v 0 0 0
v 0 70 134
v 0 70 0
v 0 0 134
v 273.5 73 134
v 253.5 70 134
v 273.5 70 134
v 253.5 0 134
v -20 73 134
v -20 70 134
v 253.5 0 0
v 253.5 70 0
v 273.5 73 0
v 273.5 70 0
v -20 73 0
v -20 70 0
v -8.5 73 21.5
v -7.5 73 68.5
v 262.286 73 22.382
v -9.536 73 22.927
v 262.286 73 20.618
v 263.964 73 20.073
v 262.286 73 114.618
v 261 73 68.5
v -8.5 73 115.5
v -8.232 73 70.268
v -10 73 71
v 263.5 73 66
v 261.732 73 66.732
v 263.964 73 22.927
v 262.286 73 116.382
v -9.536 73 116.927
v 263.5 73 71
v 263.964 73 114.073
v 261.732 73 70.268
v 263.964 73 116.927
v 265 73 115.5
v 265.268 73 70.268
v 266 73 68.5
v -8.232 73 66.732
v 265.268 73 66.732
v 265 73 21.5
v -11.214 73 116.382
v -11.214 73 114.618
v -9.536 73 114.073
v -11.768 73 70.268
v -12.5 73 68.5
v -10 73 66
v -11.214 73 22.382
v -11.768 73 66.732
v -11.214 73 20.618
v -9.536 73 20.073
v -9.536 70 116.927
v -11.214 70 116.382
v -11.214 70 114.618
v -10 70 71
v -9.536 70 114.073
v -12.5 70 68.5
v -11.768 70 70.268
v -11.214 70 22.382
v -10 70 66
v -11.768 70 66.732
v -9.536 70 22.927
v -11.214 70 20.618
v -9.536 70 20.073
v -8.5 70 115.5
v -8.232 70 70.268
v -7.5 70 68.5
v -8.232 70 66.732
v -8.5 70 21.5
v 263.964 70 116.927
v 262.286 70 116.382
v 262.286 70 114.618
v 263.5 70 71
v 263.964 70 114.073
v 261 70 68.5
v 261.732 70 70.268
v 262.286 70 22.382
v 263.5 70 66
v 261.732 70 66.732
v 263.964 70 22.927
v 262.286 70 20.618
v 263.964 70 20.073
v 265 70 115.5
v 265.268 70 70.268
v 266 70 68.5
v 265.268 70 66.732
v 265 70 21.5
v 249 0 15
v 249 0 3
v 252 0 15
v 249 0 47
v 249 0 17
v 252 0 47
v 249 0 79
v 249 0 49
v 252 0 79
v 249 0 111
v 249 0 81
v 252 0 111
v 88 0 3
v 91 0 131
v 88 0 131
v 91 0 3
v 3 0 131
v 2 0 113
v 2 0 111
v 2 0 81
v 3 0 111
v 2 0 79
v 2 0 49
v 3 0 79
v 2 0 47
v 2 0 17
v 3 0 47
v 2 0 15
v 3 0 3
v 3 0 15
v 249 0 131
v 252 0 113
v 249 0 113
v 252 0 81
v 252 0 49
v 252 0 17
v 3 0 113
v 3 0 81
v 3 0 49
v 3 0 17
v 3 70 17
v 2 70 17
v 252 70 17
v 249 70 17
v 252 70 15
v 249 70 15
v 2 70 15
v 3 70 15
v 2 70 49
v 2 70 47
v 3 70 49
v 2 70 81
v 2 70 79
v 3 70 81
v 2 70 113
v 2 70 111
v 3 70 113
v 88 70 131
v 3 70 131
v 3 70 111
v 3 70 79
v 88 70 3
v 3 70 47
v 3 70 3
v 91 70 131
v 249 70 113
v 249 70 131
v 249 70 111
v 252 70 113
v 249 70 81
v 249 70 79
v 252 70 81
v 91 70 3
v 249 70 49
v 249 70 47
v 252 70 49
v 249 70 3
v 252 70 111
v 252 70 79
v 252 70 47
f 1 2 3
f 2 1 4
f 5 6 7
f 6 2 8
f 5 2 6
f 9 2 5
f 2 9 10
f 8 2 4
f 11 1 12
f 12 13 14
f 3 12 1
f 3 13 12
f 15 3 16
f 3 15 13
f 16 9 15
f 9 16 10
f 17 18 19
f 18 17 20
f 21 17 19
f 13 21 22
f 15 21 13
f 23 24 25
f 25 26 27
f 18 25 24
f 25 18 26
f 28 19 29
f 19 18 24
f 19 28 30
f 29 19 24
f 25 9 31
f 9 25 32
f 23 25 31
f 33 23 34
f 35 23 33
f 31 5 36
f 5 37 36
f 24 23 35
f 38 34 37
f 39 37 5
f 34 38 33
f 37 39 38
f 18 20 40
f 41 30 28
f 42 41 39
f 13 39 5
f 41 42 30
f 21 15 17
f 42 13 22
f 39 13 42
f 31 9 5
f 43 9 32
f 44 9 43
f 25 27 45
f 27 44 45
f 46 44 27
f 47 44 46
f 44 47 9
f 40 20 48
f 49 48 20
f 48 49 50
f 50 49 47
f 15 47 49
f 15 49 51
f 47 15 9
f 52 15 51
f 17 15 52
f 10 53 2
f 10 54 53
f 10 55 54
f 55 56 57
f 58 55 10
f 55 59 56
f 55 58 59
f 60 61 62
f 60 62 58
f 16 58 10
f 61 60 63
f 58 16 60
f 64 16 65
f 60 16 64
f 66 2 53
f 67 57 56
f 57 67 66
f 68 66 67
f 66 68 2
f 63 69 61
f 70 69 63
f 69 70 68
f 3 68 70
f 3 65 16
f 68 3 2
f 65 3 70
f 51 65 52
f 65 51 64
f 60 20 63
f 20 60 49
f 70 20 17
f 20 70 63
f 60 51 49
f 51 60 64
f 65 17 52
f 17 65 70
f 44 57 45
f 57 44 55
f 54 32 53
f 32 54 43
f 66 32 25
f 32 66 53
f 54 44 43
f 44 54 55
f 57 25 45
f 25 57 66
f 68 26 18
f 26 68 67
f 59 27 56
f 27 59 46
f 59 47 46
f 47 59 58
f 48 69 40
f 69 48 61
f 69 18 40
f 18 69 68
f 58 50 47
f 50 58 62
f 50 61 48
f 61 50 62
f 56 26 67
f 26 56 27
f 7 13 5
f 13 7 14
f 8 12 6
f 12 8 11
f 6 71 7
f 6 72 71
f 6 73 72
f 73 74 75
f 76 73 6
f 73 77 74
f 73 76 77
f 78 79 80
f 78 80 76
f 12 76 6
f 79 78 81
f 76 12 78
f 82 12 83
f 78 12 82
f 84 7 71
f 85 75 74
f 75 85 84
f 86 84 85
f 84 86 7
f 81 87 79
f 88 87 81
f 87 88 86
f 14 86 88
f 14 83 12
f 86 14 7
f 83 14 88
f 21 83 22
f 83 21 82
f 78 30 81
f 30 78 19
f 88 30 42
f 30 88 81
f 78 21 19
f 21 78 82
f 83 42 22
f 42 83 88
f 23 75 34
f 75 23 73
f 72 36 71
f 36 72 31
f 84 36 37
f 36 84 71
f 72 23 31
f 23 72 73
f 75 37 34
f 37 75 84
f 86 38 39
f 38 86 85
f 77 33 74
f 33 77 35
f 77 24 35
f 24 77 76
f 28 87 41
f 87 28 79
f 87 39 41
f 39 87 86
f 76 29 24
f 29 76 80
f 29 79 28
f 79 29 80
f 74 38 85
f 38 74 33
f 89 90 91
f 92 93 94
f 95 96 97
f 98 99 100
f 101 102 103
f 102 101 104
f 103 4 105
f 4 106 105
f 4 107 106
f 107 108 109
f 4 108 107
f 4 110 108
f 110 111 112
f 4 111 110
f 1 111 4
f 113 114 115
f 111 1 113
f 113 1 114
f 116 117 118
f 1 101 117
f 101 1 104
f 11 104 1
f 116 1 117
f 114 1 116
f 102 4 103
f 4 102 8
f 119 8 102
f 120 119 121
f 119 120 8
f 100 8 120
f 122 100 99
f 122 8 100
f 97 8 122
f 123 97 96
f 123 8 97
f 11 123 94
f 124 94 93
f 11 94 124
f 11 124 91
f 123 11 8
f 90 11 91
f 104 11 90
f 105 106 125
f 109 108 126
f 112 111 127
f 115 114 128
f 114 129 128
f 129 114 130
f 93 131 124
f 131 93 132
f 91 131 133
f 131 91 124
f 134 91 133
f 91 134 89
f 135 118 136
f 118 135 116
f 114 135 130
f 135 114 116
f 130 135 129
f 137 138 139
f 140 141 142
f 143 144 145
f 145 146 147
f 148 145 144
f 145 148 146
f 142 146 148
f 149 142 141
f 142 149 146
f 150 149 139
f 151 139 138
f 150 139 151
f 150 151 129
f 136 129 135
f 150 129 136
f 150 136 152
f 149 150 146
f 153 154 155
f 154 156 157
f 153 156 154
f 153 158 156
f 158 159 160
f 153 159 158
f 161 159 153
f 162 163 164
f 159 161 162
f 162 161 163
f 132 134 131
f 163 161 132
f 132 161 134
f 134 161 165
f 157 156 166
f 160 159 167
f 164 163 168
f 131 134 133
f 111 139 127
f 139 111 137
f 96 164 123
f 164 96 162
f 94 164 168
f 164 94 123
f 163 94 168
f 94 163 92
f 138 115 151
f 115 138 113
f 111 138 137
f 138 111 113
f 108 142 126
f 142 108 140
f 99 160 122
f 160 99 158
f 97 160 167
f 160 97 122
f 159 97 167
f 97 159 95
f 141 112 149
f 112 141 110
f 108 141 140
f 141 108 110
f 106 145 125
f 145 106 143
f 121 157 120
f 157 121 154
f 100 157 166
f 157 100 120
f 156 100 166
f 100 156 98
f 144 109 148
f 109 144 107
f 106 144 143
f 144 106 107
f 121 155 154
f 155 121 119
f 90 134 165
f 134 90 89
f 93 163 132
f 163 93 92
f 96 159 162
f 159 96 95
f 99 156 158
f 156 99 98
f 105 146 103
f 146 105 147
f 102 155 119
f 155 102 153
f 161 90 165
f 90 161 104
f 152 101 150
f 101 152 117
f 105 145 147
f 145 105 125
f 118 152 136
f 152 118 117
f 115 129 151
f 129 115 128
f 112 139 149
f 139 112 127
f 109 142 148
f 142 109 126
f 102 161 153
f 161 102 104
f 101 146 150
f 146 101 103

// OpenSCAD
wallThickness = 3;
boardWidth = 250;
boardDepth = 70;
boardThickness = 2;

clearanceRight = 3;
clearanceLeft = 1;
clearanceTop = 20;
clearanceBottom = 10;

supportPillarOffsetLeft = 88;
supportPillarThicknessLeft = 3;
// supportPillarSupportWidthLeft = 13;
supportPillarSupportWidthLeft = 0;
supportPillarSupportOffsetTopLeft = 13;

backLipWidth = 20;

largeHoleDiameter = 5;
smallHoleDiameter = 3;
smallHoleMarginZ = 18.5;

// computed

caseWidth = boardWidth + 2.5*wallThickness - (clearanceLeft + clearanceRight);
caseDepth = boardDepth + wallThickness;
boardHeightTotal = (clearanceBottom + clearanceTop + boardThickness);
caseHeight = 4* boardHeightTotal + 2*wallThickness;

module csa_32ch_rack() {
  
  color("lightgray") {

    difference() {

      union() {

        cube([caseWidth, caseDepth, caseHeight]);

        translate([-backLipWidth, caseDepth - wallThickness, 0])
          backLip();
        translate([caseWidth, caseDepth - wallThickness, 0])
          backLip();
        
        
      }

      translate([wallThickness, 0, wallThickness])
        cube([caseWidth-2.5*wallThickness, caseDepth-wallThickness, caseHeight-2*wallThickness]);

      translate([wallThickness - clearanceLeft, 0, clearanceBottom + boardThickness + wallThickness])
        board();
      translate([wallThickness - clearanceLeft, 0, clearanceBottom + boardThickness + wallThickness + boardHeightTotal])
        board();
      translate([wallThickness - clearanceLeft, 0, clearanceBottom + boardThickness + wallThickness + 2*boardHeightTotal])
        board();
      translate([wallThickness - clearanceLeft, 0, clearanceBottom + boardThickness + wallThickness + 3*boardHeightTotal])
        board();

    }
    
    translate([supportPillarOffsetLeft, 0, 0])
      supportPillar();
    
  }
  
}

module supportPillar() {

  cube([supportPillarThicknessLeft, caseDepth, caseHeight]);

  // translate([0, 0, 0])
  //   cube([supportPillarSupportWidthLeft, caseDepth, supportPillarThicknessLeft])
  
}

module backLip() {

  difference() {

    cube([backLipWidth, wallThickness, caseHeight]);

    #translate([backLipWidth/2, wallThickness/2, smallHoleMarginZ + wallThickness])
      rotate([90, 0, 0])
        cylinder(d=smallHoleDiameter, h=2*wallThickness, center=true);
    #translate([backLipWidth/2, wallThickness/2, caseHeight - smallHoleMarginZ])
      rotate([90, 0, 0])
        cylinder(d=smallHoleDiameter, h=2*wallThickness, center=true);
    #translate([backLipWidth/2, wallThickness/2, (caseHeight-wallThickness)/2 + wallThickness])
      rotate([90, 0, 0])
        cylinder(d=largeHoleDiameter, h=2*wallThickness, center=true);
    
  }
  
}

module board() {
  
  difference() {
    color("red")
      cube([boardWidth, boardDepth, boardThickness]);

    color("blue") {
      translate([0, 0, boardThickness])
        cube([boardWidth, boardDepth, clearanceTop]);
      translate([0, 0, -boardThickness-clearanceBottom])
        cube([boardWidth, boardDepth, clearanceBottom]);
    }
  }
  
}

csa_32ch_rack();
